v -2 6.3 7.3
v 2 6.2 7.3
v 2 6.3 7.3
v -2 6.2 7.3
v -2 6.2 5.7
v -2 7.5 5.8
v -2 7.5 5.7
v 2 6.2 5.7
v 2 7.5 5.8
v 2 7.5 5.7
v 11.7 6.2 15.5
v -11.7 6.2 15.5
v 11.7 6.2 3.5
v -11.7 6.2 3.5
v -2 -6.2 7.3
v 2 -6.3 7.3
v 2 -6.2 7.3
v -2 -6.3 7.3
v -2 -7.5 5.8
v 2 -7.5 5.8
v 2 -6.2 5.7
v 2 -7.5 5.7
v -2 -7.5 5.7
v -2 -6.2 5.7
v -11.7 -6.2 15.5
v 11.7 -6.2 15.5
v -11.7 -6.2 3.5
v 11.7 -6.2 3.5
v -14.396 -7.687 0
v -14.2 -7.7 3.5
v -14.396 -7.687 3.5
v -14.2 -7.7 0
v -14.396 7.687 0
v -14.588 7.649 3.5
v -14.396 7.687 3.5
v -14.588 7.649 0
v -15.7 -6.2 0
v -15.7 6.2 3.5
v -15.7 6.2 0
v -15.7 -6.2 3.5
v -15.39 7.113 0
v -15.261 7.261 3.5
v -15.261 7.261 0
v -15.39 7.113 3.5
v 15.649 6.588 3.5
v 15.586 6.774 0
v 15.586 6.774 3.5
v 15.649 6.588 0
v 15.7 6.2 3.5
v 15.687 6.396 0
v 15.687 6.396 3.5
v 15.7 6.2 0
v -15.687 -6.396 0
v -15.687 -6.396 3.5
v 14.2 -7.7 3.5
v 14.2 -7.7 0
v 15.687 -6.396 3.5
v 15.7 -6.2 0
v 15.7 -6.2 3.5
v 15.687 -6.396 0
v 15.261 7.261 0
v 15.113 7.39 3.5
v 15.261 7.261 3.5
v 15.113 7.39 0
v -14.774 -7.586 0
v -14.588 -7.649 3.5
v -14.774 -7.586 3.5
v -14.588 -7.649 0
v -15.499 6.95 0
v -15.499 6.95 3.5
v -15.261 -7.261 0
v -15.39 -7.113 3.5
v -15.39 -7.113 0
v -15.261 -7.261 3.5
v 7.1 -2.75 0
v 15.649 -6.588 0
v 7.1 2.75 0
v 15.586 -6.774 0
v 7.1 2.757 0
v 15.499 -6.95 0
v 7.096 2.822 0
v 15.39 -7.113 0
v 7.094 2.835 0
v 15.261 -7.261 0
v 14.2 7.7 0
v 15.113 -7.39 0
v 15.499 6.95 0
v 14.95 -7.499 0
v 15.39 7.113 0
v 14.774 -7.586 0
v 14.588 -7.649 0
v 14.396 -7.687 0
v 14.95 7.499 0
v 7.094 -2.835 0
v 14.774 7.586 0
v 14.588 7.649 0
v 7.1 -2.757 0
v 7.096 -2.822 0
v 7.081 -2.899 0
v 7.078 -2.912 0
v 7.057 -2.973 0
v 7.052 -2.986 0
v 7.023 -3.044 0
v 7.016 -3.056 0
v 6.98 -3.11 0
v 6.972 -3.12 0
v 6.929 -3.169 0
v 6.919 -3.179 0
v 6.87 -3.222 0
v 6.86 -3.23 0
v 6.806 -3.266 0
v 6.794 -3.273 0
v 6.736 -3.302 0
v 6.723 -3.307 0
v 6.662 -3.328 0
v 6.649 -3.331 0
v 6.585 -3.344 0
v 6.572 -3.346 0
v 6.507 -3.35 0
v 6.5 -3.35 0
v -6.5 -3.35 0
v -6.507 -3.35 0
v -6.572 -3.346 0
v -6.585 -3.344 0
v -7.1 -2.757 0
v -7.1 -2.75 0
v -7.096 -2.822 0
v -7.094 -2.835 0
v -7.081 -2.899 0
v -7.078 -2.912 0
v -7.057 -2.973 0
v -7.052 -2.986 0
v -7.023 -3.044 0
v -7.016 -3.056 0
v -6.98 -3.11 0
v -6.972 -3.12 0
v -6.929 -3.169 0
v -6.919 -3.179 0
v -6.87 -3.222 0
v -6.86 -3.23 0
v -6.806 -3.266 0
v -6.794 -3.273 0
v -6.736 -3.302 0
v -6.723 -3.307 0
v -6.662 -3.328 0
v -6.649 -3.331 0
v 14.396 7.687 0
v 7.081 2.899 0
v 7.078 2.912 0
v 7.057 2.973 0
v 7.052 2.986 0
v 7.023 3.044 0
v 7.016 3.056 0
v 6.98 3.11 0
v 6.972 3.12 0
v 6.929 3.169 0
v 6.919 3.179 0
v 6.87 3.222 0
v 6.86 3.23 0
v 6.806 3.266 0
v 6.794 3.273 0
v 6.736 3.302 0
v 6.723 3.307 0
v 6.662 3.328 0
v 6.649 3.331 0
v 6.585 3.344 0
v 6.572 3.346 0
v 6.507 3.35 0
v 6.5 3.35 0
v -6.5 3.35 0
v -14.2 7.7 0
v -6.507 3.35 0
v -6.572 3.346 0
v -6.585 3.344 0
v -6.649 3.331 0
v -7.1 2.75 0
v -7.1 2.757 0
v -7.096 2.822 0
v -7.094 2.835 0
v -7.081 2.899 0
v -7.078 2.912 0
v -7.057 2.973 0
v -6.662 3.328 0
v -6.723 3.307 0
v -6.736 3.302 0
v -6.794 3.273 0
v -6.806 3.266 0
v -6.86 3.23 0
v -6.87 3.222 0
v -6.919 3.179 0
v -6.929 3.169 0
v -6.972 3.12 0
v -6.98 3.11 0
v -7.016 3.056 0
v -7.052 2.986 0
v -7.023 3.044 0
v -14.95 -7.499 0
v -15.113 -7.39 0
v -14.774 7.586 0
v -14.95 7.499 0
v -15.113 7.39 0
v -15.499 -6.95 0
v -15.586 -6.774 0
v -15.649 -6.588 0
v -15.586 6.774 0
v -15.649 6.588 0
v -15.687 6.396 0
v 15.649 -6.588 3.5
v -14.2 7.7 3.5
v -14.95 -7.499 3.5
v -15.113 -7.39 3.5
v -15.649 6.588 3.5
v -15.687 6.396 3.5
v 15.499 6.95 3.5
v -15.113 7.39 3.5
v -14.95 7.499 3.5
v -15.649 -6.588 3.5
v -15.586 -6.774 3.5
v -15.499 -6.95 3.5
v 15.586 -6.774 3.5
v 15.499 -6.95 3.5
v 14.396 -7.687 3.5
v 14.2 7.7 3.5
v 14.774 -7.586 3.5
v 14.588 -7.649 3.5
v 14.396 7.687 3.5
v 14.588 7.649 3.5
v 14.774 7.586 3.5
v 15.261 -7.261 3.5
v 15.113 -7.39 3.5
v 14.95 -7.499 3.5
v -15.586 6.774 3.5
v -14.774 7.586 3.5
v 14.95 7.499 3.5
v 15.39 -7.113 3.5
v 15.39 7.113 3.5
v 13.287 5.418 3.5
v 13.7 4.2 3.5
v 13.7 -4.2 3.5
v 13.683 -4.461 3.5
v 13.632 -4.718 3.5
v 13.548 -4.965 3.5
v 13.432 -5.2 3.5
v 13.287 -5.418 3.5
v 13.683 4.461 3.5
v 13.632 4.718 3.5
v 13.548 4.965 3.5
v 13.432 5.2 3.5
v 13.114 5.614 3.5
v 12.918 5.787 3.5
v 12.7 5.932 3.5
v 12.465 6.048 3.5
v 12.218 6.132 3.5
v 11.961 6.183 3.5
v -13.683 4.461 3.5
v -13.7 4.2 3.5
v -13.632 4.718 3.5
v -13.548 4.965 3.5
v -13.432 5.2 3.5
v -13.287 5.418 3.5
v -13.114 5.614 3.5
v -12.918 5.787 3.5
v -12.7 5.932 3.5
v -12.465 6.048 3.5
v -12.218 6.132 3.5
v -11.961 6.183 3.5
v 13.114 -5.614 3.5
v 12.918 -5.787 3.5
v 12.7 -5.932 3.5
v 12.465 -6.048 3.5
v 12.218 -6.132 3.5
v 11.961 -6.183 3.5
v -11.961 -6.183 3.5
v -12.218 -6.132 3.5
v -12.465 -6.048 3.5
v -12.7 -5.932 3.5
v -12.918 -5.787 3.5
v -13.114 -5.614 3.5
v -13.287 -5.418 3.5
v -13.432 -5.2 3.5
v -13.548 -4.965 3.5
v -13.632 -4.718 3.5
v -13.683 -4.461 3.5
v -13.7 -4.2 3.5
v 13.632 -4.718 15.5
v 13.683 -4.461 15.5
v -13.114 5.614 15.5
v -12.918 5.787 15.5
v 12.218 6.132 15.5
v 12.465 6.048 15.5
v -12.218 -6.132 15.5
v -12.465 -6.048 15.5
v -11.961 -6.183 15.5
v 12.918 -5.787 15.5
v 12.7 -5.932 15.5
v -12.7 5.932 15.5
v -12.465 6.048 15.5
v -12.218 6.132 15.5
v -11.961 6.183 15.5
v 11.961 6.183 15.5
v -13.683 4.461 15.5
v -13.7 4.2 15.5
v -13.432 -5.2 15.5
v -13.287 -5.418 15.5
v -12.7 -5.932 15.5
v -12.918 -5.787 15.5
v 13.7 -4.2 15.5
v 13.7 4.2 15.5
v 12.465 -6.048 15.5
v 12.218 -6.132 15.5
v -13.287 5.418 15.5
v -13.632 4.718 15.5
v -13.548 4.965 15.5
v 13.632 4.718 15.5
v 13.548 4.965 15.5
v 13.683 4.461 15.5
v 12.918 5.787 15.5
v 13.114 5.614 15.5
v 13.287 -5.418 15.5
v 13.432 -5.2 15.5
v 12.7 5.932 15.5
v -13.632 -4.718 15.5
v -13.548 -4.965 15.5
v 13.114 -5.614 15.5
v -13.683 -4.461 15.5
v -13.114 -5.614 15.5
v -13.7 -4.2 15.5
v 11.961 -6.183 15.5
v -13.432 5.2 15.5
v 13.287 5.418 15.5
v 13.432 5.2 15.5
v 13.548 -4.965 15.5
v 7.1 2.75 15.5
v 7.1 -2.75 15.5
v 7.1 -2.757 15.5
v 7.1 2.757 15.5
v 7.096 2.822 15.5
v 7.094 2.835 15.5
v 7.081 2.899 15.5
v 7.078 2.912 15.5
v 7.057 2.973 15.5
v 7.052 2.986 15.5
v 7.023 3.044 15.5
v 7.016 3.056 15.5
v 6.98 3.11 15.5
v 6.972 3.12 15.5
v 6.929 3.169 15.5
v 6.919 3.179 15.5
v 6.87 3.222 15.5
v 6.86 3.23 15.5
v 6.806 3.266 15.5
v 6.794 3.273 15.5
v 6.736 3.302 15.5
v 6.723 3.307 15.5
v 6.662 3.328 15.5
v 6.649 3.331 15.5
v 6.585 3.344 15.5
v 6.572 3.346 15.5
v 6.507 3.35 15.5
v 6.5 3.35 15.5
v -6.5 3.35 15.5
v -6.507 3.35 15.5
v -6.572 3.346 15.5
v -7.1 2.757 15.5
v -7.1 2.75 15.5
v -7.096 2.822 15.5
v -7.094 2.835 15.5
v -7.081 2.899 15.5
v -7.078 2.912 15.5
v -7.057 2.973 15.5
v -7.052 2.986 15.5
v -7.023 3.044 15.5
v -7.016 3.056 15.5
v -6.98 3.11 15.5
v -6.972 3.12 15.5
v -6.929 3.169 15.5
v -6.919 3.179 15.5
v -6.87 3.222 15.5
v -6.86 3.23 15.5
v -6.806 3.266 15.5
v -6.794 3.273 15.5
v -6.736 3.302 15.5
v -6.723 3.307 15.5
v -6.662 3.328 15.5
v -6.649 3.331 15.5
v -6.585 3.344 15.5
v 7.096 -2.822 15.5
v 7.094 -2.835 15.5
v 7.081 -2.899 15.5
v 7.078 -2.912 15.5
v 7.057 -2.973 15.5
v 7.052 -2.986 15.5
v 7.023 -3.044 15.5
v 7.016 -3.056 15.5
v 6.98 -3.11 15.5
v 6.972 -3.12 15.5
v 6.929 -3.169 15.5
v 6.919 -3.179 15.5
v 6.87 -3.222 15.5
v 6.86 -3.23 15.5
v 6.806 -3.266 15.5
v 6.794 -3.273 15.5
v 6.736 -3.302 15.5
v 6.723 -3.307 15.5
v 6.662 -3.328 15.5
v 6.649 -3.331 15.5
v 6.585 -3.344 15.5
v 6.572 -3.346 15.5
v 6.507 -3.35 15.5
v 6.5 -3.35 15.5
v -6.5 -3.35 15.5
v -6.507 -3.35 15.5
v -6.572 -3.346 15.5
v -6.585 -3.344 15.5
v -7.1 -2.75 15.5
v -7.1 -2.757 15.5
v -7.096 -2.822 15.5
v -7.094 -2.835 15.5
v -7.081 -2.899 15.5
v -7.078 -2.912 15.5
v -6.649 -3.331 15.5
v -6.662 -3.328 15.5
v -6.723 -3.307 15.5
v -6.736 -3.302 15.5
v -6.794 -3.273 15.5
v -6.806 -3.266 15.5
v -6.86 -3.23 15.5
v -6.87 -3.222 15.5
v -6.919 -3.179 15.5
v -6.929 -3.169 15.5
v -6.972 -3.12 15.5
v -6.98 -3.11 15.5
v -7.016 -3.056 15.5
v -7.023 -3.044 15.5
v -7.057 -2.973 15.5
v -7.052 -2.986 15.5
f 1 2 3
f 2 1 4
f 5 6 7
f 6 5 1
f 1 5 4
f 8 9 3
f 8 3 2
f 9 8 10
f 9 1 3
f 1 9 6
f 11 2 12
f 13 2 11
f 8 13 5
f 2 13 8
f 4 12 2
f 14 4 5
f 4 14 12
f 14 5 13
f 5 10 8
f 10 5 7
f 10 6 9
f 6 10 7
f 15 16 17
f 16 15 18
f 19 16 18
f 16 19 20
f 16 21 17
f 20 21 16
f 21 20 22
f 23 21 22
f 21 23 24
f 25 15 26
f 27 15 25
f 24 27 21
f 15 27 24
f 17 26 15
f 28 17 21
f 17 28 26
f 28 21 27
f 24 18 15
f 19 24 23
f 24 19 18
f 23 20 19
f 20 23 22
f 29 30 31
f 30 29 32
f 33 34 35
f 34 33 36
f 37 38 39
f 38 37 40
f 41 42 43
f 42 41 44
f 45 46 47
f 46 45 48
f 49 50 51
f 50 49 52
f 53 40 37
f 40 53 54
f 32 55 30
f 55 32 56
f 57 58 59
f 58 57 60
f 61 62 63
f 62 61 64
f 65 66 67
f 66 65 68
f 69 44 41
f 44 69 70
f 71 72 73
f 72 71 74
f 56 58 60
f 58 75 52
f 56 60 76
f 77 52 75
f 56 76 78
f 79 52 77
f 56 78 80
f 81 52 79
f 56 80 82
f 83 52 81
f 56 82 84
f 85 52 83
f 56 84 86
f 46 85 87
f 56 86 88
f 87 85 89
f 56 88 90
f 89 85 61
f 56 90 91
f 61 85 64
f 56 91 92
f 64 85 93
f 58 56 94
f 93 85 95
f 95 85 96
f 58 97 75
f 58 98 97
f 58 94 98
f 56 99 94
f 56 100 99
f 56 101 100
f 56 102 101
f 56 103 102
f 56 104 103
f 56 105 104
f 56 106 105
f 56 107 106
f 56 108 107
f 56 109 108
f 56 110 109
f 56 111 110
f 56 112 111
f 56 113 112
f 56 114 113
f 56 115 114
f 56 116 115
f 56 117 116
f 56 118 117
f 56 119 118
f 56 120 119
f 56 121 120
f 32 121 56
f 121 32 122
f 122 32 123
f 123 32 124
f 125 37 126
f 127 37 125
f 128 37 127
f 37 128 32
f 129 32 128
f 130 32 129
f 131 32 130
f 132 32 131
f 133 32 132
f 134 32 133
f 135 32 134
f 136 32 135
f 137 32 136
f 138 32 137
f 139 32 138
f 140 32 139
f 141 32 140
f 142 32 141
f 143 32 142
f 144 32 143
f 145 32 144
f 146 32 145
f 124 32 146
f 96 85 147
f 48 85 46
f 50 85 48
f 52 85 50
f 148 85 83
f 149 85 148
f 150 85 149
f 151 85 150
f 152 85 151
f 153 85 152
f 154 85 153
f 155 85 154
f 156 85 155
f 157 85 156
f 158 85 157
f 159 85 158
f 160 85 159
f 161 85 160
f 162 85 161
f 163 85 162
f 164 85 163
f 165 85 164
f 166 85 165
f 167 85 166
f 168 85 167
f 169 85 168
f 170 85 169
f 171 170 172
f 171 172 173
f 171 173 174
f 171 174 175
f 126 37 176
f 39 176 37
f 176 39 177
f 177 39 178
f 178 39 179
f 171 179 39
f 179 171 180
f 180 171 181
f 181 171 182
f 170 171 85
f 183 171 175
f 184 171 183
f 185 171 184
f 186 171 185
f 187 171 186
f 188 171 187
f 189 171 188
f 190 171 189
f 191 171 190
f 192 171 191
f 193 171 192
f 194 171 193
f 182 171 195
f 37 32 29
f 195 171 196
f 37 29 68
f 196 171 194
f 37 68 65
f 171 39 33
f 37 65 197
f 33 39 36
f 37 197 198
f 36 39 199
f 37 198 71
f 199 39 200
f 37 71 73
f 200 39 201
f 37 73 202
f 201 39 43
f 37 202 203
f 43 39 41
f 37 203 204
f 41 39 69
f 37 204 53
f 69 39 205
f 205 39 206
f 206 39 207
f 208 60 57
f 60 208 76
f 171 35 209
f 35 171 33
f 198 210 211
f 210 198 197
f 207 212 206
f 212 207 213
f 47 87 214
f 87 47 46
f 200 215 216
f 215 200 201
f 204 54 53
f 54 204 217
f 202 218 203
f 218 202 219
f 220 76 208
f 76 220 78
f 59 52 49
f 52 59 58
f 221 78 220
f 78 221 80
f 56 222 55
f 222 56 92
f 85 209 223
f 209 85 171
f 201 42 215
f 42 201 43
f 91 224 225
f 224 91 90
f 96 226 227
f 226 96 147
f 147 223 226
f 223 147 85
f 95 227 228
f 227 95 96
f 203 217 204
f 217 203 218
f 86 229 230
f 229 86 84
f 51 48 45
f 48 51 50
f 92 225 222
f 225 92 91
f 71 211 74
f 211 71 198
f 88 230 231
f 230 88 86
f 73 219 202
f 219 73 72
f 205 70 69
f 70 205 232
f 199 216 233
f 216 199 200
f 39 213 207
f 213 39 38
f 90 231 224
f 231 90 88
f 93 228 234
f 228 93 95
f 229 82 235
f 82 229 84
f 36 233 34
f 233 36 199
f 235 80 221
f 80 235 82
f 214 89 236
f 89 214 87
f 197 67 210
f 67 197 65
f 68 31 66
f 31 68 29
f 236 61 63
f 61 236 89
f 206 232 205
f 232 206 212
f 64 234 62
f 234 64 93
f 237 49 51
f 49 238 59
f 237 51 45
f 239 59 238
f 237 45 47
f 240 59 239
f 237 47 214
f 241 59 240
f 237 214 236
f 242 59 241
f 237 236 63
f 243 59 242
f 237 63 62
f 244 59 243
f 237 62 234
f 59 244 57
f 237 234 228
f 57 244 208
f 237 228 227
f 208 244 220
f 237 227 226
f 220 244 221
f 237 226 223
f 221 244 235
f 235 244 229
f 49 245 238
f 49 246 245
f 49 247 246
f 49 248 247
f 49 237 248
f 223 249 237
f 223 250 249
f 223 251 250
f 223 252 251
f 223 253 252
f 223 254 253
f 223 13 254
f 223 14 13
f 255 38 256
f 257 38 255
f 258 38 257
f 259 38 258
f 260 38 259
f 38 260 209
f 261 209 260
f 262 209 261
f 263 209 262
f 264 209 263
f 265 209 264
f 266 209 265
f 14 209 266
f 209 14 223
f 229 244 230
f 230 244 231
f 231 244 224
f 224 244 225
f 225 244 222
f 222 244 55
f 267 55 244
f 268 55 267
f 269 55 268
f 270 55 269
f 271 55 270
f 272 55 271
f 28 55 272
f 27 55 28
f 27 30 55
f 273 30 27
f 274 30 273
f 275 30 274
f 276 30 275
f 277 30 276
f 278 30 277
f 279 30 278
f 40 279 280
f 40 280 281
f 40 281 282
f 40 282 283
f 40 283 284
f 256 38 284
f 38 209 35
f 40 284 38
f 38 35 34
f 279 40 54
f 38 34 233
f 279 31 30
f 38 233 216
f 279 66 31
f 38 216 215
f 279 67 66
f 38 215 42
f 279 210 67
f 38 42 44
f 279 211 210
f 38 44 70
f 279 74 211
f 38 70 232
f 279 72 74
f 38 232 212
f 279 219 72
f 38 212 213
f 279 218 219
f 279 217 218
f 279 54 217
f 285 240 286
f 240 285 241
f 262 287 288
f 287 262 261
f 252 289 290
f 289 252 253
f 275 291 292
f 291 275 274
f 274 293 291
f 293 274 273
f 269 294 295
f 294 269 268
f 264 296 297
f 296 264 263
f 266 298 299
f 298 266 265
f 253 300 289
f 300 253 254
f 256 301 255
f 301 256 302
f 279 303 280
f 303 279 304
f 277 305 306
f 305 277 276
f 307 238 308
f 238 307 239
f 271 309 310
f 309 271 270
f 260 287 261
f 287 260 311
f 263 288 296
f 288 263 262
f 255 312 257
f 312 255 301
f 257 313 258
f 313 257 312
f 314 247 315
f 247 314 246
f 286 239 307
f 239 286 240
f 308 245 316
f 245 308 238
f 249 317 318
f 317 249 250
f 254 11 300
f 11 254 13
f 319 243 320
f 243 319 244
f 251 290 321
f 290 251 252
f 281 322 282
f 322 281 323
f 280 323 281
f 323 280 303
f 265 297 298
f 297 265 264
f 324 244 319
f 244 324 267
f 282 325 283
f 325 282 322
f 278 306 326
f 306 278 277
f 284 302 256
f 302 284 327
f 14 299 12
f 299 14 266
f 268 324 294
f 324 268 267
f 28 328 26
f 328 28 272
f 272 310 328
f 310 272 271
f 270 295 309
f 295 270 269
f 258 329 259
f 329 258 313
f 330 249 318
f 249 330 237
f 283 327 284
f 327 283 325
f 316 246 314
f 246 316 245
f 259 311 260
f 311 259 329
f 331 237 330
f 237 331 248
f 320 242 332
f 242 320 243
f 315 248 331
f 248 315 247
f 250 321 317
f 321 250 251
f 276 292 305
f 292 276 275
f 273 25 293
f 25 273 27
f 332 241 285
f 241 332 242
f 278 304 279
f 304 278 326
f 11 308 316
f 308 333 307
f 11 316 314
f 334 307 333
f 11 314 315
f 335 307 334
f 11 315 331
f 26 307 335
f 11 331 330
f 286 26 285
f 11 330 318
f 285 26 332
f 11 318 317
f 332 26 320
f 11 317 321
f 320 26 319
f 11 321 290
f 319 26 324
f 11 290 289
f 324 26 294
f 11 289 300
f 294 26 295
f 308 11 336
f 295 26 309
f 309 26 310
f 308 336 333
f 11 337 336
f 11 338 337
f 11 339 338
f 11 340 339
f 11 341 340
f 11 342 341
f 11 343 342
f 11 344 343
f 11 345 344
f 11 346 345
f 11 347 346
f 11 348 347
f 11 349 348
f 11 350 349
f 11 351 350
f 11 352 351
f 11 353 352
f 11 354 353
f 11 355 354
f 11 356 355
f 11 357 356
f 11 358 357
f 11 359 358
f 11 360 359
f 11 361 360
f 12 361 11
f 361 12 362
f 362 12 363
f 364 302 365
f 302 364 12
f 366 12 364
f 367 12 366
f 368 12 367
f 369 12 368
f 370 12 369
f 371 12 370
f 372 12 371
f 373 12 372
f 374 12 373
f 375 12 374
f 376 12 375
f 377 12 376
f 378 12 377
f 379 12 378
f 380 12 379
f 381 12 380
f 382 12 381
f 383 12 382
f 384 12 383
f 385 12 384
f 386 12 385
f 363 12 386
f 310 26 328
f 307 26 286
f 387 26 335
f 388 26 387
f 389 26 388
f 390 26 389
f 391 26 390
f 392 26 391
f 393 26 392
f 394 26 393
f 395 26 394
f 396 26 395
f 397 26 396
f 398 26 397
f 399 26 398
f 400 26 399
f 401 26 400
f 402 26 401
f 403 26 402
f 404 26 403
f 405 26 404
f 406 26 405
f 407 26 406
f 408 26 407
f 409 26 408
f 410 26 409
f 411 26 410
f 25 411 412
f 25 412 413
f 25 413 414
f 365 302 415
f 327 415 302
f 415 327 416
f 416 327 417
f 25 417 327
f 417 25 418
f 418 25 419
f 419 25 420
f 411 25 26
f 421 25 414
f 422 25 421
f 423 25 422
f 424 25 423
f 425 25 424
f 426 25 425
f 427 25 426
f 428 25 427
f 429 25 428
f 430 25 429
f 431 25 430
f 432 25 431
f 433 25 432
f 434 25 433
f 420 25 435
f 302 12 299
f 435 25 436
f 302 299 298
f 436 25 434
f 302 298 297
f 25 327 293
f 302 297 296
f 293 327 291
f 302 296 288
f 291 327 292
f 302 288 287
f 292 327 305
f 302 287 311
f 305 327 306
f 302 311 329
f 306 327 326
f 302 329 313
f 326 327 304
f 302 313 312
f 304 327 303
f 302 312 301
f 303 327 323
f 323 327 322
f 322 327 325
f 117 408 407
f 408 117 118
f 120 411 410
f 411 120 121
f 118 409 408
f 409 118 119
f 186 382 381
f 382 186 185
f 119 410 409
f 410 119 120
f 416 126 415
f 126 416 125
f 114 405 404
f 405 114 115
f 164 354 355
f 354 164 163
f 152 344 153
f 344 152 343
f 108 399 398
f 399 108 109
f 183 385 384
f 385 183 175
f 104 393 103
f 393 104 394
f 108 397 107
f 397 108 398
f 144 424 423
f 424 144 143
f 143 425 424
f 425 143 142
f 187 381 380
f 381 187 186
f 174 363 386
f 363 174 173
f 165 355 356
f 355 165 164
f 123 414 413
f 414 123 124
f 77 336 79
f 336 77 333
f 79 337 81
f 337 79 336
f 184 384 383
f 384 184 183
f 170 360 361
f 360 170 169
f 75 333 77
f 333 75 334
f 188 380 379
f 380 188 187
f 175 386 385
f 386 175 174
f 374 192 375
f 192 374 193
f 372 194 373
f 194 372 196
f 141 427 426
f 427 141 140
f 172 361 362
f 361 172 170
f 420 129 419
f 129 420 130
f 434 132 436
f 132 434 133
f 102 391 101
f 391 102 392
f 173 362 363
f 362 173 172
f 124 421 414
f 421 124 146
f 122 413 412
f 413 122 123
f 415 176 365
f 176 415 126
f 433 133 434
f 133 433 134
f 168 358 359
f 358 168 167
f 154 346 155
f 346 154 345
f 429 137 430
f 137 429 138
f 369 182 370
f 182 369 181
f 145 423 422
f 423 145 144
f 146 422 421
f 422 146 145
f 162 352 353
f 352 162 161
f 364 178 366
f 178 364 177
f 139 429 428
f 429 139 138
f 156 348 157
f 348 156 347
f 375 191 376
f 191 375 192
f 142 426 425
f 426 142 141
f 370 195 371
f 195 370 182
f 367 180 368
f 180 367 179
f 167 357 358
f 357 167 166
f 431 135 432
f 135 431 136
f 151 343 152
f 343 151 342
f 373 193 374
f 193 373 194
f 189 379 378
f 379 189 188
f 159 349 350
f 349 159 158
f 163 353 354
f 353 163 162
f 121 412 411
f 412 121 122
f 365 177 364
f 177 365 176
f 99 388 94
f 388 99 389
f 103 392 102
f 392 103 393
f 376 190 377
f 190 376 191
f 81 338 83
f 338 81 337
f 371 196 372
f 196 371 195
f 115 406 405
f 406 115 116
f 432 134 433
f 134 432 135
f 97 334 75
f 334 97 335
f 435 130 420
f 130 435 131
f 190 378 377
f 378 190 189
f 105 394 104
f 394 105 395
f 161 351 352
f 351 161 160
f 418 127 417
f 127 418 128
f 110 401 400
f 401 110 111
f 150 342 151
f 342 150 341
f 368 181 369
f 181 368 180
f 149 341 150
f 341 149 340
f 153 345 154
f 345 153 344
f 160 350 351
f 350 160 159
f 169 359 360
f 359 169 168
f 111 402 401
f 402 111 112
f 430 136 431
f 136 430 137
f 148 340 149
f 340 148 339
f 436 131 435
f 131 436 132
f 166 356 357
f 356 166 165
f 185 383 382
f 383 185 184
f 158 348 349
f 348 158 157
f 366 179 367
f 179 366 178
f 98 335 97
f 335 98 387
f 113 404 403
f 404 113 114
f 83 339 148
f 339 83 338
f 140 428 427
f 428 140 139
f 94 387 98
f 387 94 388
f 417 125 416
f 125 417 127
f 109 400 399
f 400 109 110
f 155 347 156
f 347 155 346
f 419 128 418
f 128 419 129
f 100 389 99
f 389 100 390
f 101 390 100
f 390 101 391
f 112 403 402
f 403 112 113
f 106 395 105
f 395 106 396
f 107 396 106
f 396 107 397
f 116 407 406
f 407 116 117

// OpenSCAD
// file: parameters.scad
// ============================================
// MODULAR CABLE ORGANIZER - SHARED PARAMETERS
// ============================================
// All dimensions in mm - include this in all files
// ============================================

$fn = 48;

// === TOLERANCES ===
clearance = 0.3;
port_clearance = 0.1;  // Extra clearance for port openings (reduced - 0.2 was too loose for USB-C)
wall = 1.6;

// === SLOT DIMENSIONS (2:1 aspect ratio) - scaled to 2/3 ===
slot_width = 32;  // Reduced by 1mm for more compact insert
slot_height = 16;  // Reduced by 1mm for more compact insert
slot_depth = 4;  // Reduced from 6mm - less frame depth needed

// === FRAME STRUCTURE ===
frame_wall = 0.5;   // Reduced for more compact frame
frame_border = 8;  // Increased by 10mm for mounting holes with countersink
frame_back = 2;     // Slightly thicker for snap catch strength
mount_hole_dia = 3;
countersink_dia = 6;  // Diameter of countersink for screw heads
countersink_depth = 2;  // Depth of countersink

// === GRID ===
grid_cols = 2;
grid_rows = 2;

// === INSERT BASE DIMENSIONS ===
insert_width = slot_width - (2 * clearance);
insert_height = slot_height - (2 * clearance);
insert_base_depth = slot_depth - 0.5;

// === INSERT BODY (protrudes from frame) ===
insert_body_width = insert_width - 4;
insert_body_height = insert_height - 3;
insert_body_depth = 12;  // Deep enough to accommodate male cable connectors
insert_top_thick = 1.5;  // Top platform thickness

// === SNAP TABS (on neck/body - catch on back plate) ===
snap_tab_width = 4;
snap_tab_protrude = 1.2;  // How far tab sticks out from body
snap_tab_thick = 1.5;     // Z thickness of tab
snap_tab_offset = 2.2;      // Distance from base to tab bottom on insert (increased to clear frame)

// === CONNECTOR PORT DIMENSIONS & BODY DEPTHS ===
// Port dimensions from reference blueprints
// Body depths sized to match typical male connector lengths

// USB-C: 8.4 x 2.6mm, male connector ~9mm
usbc_w = 8.4;
usbc_h = 2.6;
usbc_r = 1.0;
usbc_body_depth = 9;

// USB-A: 14.0 x 6.5mm, male connector ~13mm
usba_w = 14.0;
usba_h = 6.5;
usba_r = 0.5;
usba_body_depth = 13;

// USB Mini: 6.9 x 3.0mm, male connector ~9mm
usb_mini_w = 6.9;
usb_mini_h = 3.0;
usb_mini_r = 0.5;
usb_mini_body_depth = 9;

// USB Micro: 6.9 x 1.8mm, male connector ~7mm
usb_micro_w = 6.9;
usb_micro_h = 1.8;
usb_micro_r = 0.3;
usb_micro_body_depth = 7;

// USB-B: 8.0 x 7.5mm, male connector ~14mm
usb_b_w = 8.0;
usb_b_h = 7.5;
usb_b_r = 1.0;
usb_b_body_depth = 14;

// Lightning: 6.7 x 1.5mm, male connector ~8mm
lightning_w = 6.7;
lightning_h = 1.5;
lightning_r = 0.5;
lightning_body_depth = 8;

// HDMI: 14.0 x 4.5mm, male connector ~16mm
hdmi_w = 14.0;
hdmi_h = 4.5;
hdmi_r = 0.5;
hdmi_body_depth = 16;

// 3.5mm Audio Jack: male plug ~14mm
audio_jack_dia = 6.0;
audio_jack_body_depth = 14;

// Blank/Label: recessed area for label
label_w = 30;
label_h = 12;
label_depth = 0.8;

// === CALCULATED VALUES ===
frame_total_depth = frame_back + slot_depth;
grid_width = (grid_cols * slot_width) + ((grid_cols - 1) * frame_wall);
grid_height = (grid_rows * slot_height) + ((grid_rows - 1) * frame_wall);
frame_width = grid_width + (2 * frame_border);
frame_height_total = grid_height + (2 * frame_border);
insert_total_depth = insert_base_depth + insert_body_depth;
// file: insert_base.scad
// ============================================
// MODULAR CABLE ORGANIZER - BASE INSERT MODULE
// ============================================
// This is the parent module for all insert types
// Include this file and call insert_with_port() with a port shape
// ============================================

include <parameters.scad>

// === BASE INSERT WITH CUSTOM BODY DEPTH ===
module insert_blank_custom(body_depth) {
    union() {
        // Base plate (sits in frame slot)
        rounded_box_rect(insert_width, insert_height, insert_base_depth, 1.5);
        
        // Body (protrudes out front) - custom depth
        translate([0, 0, insert_base_depth])
            rounded_box_rect(insert_body_width, insert_body_height, body_depth, 2);
        
        // Snap tabs on all 4 sides
        snap_tabs_all();
    }
}

// === BASE INSERT (default depth - for backwards compatibility) ===
module insert_blank() {
    insert_blank_custom(insert_body_depth);
}

// === INSERT WITH THROUGH-HOLE PORT (custom depth) ===
// Pass body_depth and a 2D shape as children
module insert_with_port_custom(body_depth) {
    total_depth = insert_base_depth + body_depth;
    difference() {
        insert_blank_custom(body_depth);
        
        // Cut port hole ALL THE WAY through (tube shape)
        translate([0, 0, -0.1])
            linear_extrude(total_depth + 0.2)
            offset(r=port_clearance)  // Add clearance to port opening
            children();
    }
}

// === INSERT WITH THROUGH-HOLE PORT (default depth) ===
module insert_with_port() {
    insert_with_port_custom(insert_body_depth) children();
}

// === PRE-MADE INSERT MODULES WITH CORRECT DEPTHS ===
module insert_usbc() {
    insert_with_port_custom(usbc_body_depth) port_usbc();
}

module insert_usba() {
    insert_with_port_custom(usba_body_depth) port_usba();
}

module insert_usb_mini() {
    insert_with_port_custom(usb_mini_body_depth) port_usb_mini();
}

module insert_usb_micro() {
    insert_with_port_custom(usb_micro_body_depth) port_usb_micro();
}

module insert_usb_b() {
    insert_with_port_custom(usb_b_body_depth) port_usb_b();
}

module insert_lightning() {
    insert_with_port_custom(lightning_body_depth) port_lightning();
}

module insert_hdmi() {
    insert_with_port_custom(hdmi_body_depth) port_hdmi();
}

module insert_audio_jack() {
    insert_with_port_custom(audio_jack_body_depth) port_audio_jack();
}

// === SNAP TABS (on neck/body - catch on frame cutouts) ===
// Tabs are on the body, positioned to engage with frame wall cutouts
module snap_tabs_all() {
    // Position tabs up on body (clear of base/frame)
    tab_z = insert_base_depth + snap_tab_offset;
    
    // Tabs on all 4 sides of the body
    for (angle = [0, 90, 180, 270]) {
        rotate([0, 0, angle])
            translate([0, insert_body_height/2, tab_z])
            neck_snap_tab();
    }
}

module neck_snap_tab() {
    // Wedge shape (FLIPPED): 
    // - Peak/taper on BOTTOM - slides past back plate when inserting
    // - Flat on TOP - catches and holds
    hull() {
        // Peak of wedge (protruding, at BOTTOM of tab)
        translate([-snap_tab_width/2, snap_tab_protrude, 0])
            cube([snap_tab_width, 0.1, 0.1]);
        // Flat top (at body surface, TOP of tab)
        translate([-snap_tab_width/2, 0, snap_tab_thick])
            cube([snap_tab_width, 0.1, 0.1]);
        // Base of wedge (at body surface, bottom)
        translate([-snap_tab_width/2, 0, 0])
            cube([snap_tab_width, 0.1, 0.1]);
    }
}

module snap_tab_horizontal() {
    hull() {
        translate([0, -snap_tab_protrude/2, 0])
            cube([snap_tab_width, 0.1, snap_tab_thick], center=true);
        translate([0, snap_tab_protrude/2, snap_tab_thick * 0.2])
            cube([snap_tab_width, 0.1, snap_tab_thick * 0.6], center=true);
    }
}

module snap_tab_vertical() {
    hull() {
        translate([-snap_tab_protrude/2, 0, 0])
            cube([0.1, snap_tab_width, snap_tab_thick], center=true);
        translate([snap_tab_protrude/2, 0, snap_tab_thick * 0.2])
            cube([0.1, snap_tab_width, snap_tab_thick * 0.6], center=true);
    }
}

// === UTILITY MODULES ===
module rounded_box_rect(w, d, h, r) {
    translate([0, 0, h/2])
        hull() {
            for (x = [-1, 1], y = [-1, 1])
                translate([x * (w/2 - r), y * (d/2 - r), 0])
                    cylinder(h=h, r=r, center=true);
        }
}

// === PORT SHAPE MODULES (2D) ===
// These define the cutout shapes for each connector type

module port_rounded_rect(w, h, r) {
    // Standard rounded rectangle
    hull() {
        for (x = [-1, 1], y = [-1, 1])
            translate([x * (w/2 - r), y * (h/2 - r)])
                circle(r=r);
    }
}

module port_usbc() {
    port_rounded_rect(usbc_w, usbc_h, usbc_r);
}

module port_usba() {
    port_rounded_rect(usba_w, usba_h, usba_r);
}

module port_usb_mini() {
    port_rounded_rect(usb_mini_w, usb_mini_h, usb_mini_r);
}

module port_usb_micro() {
    port_rounded_rect(usb_micro_w, usb_micro_h, usb_micro_r);
}

module port_usb_b() {
    // USB-B has beveled top corners
    hull() {
        // Bottom corners (full radius)
        for (x = [-1, 1])
            translate([x * (usb_b_w/2 - usb_b_r), -(usb_b_h/2 - usb_b_r)])
                circle(r=usb_b_r);
        // Top corners (chamfered - moved inward)
        for (x = [-1, 1])
            translate([x * (usb_b_w/2 - usb_b_r - 1), (usb_b_h/2 - usb_b_r)])
                circle(r=usb_b_r);
    }
}

module port_lightning() {
    port_rounded_rect(lightning_w, lightning_h, lightning_r);
}

module port_hdmi() {
    // HDMI is tapered (wider at top)
    hull() {
        // Top (wider)
        for (x = [-1, 1])
            translate([x * (hdmi_w/2 - hdmi_r), (hdmi_h/2 - hdmi_r)])
                circle(r=hdmi_r);
        // Bottom (narrower)
        for (x = [-1, 1])
            translate([x * (hdmi_w/2 - hdmi_r - 1), -(hdmi_h/2 - hdmi_r)])
                circle(r=hdmi_r);
    }
}

module port_audio_jack() {
    circle(d=audio_jack_dia);
}

module port_label_recess() {
    // Shallow rectangular recess for labels
    square([label_w, label_h], center=true);
}

// === RENDER (for testing this file directly) ===
// insert_blank();
// main file
// ============================================
// USB-A FEMALE INSERT
// Port: 14.0mm x 6.5mm rectangle
// ============================================

include <insert_base.scad>

module insert_usba() {
    insert_with_port() port_usba();
}

// Render
insert_usba();
